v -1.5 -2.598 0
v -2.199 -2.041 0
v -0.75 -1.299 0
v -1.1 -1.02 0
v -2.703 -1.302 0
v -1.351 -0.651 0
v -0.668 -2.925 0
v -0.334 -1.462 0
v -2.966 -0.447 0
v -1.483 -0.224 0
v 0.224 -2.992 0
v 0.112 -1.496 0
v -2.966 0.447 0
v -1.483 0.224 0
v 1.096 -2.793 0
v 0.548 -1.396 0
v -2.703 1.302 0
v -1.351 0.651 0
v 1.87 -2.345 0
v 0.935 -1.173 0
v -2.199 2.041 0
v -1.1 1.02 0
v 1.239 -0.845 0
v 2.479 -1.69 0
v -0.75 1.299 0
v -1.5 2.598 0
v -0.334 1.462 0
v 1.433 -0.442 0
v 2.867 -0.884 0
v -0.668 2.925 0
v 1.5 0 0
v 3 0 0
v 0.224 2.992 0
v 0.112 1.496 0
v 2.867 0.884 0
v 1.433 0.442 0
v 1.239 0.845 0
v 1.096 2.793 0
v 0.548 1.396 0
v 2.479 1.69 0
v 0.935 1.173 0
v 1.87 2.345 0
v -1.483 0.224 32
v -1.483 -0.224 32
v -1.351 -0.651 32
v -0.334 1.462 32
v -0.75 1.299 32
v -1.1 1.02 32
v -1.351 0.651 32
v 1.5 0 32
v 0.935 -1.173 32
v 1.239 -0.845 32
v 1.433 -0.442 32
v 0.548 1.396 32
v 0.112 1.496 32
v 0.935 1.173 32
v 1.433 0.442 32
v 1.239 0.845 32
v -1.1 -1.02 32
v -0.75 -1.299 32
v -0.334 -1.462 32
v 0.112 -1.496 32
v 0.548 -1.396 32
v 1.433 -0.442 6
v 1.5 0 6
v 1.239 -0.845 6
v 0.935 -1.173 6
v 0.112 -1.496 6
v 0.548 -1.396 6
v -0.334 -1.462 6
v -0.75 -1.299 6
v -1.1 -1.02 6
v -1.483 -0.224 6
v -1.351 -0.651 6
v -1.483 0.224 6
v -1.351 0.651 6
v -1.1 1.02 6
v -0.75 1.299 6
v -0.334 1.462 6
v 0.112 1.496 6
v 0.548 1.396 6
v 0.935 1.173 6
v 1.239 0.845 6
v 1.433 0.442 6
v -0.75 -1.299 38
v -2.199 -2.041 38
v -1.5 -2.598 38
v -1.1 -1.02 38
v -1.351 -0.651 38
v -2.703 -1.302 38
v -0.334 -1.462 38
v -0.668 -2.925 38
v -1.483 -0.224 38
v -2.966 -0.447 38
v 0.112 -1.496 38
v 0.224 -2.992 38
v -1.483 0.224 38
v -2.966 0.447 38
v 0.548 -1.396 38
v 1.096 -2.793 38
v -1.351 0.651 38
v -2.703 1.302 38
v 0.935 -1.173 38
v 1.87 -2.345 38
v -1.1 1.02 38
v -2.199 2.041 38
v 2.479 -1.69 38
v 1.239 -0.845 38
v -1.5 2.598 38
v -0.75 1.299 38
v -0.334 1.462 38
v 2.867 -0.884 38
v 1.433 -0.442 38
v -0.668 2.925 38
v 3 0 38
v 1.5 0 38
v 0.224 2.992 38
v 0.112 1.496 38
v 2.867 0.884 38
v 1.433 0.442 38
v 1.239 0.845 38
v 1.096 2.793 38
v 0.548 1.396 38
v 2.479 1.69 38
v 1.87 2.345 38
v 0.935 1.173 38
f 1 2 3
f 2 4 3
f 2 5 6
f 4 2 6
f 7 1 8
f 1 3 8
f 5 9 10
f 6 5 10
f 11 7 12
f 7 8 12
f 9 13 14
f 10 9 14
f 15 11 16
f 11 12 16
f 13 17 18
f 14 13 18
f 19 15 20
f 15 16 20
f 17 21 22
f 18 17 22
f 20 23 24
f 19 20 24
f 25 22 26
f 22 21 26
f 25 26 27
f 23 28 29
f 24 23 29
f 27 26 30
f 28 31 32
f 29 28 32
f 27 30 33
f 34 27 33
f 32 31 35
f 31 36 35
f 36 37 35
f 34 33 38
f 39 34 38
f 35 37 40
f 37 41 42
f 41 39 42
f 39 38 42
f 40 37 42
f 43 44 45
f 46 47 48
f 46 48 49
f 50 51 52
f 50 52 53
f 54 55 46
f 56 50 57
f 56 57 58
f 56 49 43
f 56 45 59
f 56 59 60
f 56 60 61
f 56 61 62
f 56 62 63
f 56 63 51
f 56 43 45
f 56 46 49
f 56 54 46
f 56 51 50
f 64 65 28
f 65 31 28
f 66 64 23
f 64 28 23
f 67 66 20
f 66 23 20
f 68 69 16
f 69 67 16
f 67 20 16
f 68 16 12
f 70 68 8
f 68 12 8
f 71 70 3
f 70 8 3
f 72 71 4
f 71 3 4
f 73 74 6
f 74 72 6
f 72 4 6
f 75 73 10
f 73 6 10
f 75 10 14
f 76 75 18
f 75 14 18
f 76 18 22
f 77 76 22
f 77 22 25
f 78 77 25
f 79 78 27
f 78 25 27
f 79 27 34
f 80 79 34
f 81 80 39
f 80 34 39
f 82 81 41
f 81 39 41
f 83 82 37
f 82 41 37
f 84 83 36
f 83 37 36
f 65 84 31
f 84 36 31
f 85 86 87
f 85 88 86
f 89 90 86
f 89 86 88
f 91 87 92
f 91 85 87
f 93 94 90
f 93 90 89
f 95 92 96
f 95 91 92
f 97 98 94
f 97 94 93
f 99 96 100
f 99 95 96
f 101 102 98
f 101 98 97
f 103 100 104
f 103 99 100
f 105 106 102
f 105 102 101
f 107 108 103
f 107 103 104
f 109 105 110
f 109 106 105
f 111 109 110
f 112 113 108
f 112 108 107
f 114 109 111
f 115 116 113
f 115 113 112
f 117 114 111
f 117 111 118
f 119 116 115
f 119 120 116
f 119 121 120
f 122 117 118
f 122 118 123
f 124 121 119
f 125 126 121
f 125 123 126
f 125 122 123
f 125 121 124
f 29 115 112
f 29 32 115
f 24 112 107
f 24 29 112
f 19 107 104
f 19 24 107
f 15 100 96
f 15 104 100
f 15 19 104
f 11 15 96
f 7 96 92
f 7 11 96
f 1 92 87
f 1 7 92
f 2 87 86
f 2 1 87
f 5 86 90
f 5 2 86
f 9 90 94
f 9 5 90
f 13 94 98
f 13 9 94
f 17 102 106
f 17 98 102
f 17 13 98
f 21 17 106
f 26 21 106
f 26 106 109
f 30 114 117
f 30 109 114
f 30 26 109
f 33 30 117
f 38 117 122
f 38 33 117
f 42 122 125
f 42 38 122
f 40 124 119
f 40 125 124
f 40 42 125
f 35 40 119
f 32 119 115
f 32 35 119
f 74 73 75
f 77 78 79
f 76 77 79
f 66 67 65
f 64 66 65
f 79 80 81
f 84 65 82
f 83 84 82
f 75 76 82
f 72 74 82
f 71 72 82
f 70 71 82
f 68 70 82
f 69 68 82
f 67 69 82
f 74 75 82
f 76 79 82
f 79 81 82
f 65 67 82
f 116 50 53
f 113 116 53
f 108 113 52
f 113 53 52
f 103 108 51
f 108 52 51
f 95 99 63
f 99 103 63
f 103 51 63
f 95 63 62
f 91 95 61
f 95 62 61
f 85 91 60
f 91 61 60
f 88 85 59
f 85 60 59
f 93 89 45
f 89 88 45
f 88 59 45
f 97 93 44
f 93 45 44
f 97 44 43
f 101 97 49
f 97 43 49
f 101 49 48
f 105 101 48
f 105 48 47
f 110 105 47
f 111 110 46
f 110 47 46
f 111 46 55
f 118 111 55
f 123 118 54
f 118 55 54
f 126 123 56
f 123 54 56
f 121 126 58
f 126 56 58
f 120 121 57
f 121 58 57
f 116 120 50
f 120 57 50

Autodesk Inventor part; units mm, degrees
ref_plane "YZ Plane" through (0, 0, 0) normal (1, 0, 0) x (0, 1, 0)
ref_plane "XZ Plane" through (0, 0, 0) normal (0, 1, 0) x (-1, 0, 0)
sketch "スケッチ1" plane through (0, 0, 0) normal (0, 0, 1) x (1, 0, 0)
  circle A0 centre (0, 0) radius 1.5
  circle A1 centre (0, 0) radius 3
  dimension "d0" = 3
  dimension "d1" = 6
extrude "押し出し1" add sketch "スケッチ1" along normal blind 38
ref_plane "作業平面1" through (0, 0, 32) normal (0, 0, 1) x (1, 0, 0)
sketch "スケッチ3" plane through (0, 0, 32) normal (0, 0, 1) x (1, 0, 0)
  circle A0 centre (0, 0) radius 1.5 projected
extrude "押し出し3" add sketch "スケッチ3" against normal blind 26
properties part number "スペーサーm3,38 自作" material "アルミニウム 7075"
